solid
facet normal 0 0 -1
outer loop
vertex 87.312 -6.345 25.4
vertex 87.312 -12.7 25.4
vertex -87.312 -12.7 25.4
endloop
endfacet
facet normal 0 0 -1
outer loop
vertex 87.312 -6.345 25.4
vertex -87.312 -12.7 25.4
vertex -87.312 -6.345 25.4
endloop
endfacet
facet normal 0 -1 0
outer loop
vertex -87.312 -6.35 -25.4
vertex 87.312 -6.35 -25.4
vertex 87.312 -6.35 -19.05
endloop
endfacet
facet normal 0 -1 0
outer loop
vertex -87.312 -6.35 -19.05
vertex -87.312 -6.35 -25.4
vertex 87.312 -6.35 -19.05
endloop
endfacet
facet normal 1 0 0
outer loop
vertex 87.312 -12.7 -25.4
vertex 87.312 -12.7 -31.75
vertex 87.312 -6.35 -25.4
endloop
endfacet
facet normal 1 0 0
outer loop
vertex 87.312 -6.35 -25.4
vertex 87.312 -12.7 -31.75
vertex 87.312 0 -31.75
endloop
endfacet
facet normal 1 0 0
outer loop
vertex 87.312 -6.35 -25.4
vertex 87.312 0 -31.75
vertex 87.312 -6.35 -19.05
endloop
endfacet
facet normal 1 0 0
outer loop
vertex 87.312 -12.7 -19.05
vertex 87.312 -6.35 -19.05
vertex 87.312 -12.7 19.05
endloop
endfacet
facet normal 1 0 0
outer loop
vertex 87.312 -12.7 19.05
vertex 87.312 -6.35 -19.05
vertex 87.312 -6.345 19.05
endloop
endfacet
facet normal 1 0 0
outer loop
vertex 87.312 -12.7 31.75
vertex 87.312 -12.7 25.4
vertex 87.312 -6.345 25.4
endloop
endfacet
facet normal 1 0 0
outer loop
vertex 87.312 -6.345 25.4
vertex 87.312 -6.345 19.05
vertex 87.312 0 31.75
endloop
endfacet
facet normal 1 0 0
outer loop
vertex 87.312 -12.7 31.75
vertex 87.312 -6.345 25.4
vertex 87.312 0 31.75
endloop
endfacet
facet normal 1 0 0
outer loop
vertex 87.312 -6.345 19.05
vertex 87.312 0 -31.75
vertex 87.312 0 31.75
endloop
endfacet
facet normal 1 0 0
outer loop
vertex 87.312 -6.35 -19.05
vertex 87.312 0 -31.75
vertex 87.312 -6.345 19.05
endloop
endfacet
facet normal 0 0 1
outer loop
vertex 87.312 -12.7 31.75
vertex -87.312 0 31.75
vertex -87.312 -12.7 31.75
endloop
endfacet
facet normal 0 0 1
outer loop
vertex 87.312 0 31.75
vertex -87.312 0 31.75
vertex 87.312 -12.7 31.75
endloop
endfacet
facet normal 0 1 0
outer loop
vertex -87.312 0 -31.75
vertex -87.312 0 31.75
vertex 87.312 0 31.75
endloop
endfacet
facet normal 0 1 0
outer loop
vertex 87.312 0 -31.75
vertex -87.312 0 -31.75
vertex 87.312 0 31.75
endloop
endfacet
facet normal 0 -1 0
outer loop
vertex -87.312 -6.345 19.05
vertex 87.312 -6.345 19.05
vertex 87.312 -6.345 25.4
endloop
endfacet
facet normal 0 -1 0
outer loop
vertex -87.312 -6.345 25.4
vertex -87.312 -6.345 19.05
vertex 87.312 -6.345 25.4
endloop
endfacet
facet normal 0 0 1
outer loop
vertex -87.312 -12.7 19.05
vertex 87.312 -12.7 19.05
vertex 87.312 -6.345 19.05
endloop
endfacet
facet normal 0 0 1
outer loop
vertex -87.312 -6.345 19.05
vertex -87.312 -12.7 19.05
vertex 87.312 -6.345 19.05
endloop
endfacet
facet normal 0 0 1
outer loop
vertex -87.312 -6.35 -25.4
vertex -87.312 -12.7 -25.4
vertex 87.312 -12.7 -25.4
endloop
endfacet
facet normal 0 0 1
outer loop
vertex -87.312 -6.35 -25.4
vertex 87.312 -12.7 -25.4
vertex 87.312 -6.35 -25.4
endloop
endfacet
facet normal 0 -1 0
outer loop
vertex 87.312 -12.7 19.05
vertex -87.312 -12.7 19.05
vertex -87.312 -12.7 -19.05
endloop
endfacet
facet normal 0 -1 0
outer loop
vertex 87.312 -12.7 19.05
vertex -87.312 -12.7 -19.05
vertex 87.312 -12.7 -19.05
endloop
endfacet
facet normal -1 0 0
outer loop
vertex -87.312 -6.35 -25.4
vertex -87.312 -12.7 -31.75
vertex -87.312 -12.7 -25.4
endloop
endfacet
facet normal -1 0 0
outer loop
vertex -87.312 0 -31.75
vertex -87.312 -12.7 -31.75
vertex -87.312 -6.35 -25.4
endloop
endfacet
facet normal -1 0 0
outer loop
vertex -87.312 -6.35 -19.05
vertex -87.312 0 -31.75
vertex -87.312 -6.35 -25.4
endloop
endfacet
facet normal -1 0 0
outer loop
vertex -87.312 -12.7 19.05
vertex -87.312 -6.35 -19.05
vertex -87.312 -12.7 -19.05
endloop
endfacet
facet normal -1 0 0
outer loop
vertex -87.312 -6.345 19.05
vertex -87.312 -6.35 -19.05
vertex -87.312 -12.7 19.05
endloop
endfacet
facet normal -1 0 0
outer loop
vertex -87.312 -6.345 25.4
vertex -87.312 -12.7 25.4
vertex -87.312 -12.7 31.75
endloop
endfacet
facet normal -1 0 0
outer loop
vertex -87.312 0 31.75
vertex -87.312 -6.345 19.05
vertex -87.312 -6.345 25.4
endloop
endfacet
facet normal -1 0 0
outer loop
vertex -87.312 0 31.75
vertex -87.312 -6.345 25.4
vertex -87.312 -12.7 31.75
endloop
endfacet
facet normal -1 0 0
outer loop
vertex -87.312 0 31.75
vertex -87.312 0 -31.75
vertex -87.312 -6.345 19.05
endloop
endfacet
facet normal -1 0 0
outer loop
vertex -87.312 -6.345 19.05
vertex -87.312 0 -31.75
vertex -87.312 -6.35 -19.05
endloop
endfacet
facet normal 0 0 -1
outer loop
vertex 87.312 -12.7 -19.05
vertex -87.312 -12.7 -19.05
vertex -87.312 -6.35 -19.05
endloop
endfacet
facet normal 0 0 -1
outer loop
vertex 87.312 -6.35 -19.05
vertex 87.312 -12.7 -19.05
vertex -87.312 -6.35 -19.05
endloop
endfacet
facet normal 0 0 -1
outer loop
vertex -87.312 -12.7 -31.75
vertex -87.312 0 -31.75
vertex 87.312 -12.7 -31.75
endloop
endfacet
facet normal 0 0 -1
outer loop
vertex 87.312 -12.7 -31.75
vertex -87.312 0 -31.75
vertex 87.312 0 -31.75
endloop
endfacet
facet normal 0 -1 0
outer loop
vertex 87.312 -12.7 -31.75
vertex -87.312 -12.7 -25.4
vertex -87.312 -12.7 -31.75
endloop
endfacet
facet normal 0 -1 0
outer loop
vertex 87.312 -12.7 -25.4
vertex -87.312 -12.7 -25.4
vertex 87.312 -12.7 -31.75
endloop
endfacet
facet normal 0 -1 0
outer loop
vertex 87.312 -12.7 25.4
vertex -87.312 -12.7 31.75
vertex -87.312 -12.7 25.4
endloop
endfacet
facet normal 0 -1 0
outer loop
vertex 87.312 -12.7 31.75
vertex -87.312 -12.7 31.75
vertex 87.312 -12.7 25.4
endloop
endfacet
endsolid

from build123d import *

# Parameters (mm, degrees)
F0_W     = 174.625
F0_H     = 63.5
F1_DEPTH = 12.7
F2_W     = 6.3549128033
F2_H     = 6.35
F2_W_2   = 6.35
F3_DEPTH = 174.625


with BuildPart() as f1:
    # F0 (on Front) → F1 (new body)
    with BuildSketch(Plane.XZ):
        Rectangle(F0_W, F0_H)
    extrude(amount=F1_DEPTH)

    # F2 (on face) → F3 (cut, through all)
    with BuildSketch(Plane.YZ.offset(87.3125)):
        with Locations((-9.5225435983, 22.225)):
            Rectangle(F2_W, F2_H)
        with Locations((-9.525, -22.225)):
            Rectangle(F2_W_2, F2_H)
    extrude(amount=-F3_DEPTH, mode=Mode.SUBTRACT)


solid = f1.part
